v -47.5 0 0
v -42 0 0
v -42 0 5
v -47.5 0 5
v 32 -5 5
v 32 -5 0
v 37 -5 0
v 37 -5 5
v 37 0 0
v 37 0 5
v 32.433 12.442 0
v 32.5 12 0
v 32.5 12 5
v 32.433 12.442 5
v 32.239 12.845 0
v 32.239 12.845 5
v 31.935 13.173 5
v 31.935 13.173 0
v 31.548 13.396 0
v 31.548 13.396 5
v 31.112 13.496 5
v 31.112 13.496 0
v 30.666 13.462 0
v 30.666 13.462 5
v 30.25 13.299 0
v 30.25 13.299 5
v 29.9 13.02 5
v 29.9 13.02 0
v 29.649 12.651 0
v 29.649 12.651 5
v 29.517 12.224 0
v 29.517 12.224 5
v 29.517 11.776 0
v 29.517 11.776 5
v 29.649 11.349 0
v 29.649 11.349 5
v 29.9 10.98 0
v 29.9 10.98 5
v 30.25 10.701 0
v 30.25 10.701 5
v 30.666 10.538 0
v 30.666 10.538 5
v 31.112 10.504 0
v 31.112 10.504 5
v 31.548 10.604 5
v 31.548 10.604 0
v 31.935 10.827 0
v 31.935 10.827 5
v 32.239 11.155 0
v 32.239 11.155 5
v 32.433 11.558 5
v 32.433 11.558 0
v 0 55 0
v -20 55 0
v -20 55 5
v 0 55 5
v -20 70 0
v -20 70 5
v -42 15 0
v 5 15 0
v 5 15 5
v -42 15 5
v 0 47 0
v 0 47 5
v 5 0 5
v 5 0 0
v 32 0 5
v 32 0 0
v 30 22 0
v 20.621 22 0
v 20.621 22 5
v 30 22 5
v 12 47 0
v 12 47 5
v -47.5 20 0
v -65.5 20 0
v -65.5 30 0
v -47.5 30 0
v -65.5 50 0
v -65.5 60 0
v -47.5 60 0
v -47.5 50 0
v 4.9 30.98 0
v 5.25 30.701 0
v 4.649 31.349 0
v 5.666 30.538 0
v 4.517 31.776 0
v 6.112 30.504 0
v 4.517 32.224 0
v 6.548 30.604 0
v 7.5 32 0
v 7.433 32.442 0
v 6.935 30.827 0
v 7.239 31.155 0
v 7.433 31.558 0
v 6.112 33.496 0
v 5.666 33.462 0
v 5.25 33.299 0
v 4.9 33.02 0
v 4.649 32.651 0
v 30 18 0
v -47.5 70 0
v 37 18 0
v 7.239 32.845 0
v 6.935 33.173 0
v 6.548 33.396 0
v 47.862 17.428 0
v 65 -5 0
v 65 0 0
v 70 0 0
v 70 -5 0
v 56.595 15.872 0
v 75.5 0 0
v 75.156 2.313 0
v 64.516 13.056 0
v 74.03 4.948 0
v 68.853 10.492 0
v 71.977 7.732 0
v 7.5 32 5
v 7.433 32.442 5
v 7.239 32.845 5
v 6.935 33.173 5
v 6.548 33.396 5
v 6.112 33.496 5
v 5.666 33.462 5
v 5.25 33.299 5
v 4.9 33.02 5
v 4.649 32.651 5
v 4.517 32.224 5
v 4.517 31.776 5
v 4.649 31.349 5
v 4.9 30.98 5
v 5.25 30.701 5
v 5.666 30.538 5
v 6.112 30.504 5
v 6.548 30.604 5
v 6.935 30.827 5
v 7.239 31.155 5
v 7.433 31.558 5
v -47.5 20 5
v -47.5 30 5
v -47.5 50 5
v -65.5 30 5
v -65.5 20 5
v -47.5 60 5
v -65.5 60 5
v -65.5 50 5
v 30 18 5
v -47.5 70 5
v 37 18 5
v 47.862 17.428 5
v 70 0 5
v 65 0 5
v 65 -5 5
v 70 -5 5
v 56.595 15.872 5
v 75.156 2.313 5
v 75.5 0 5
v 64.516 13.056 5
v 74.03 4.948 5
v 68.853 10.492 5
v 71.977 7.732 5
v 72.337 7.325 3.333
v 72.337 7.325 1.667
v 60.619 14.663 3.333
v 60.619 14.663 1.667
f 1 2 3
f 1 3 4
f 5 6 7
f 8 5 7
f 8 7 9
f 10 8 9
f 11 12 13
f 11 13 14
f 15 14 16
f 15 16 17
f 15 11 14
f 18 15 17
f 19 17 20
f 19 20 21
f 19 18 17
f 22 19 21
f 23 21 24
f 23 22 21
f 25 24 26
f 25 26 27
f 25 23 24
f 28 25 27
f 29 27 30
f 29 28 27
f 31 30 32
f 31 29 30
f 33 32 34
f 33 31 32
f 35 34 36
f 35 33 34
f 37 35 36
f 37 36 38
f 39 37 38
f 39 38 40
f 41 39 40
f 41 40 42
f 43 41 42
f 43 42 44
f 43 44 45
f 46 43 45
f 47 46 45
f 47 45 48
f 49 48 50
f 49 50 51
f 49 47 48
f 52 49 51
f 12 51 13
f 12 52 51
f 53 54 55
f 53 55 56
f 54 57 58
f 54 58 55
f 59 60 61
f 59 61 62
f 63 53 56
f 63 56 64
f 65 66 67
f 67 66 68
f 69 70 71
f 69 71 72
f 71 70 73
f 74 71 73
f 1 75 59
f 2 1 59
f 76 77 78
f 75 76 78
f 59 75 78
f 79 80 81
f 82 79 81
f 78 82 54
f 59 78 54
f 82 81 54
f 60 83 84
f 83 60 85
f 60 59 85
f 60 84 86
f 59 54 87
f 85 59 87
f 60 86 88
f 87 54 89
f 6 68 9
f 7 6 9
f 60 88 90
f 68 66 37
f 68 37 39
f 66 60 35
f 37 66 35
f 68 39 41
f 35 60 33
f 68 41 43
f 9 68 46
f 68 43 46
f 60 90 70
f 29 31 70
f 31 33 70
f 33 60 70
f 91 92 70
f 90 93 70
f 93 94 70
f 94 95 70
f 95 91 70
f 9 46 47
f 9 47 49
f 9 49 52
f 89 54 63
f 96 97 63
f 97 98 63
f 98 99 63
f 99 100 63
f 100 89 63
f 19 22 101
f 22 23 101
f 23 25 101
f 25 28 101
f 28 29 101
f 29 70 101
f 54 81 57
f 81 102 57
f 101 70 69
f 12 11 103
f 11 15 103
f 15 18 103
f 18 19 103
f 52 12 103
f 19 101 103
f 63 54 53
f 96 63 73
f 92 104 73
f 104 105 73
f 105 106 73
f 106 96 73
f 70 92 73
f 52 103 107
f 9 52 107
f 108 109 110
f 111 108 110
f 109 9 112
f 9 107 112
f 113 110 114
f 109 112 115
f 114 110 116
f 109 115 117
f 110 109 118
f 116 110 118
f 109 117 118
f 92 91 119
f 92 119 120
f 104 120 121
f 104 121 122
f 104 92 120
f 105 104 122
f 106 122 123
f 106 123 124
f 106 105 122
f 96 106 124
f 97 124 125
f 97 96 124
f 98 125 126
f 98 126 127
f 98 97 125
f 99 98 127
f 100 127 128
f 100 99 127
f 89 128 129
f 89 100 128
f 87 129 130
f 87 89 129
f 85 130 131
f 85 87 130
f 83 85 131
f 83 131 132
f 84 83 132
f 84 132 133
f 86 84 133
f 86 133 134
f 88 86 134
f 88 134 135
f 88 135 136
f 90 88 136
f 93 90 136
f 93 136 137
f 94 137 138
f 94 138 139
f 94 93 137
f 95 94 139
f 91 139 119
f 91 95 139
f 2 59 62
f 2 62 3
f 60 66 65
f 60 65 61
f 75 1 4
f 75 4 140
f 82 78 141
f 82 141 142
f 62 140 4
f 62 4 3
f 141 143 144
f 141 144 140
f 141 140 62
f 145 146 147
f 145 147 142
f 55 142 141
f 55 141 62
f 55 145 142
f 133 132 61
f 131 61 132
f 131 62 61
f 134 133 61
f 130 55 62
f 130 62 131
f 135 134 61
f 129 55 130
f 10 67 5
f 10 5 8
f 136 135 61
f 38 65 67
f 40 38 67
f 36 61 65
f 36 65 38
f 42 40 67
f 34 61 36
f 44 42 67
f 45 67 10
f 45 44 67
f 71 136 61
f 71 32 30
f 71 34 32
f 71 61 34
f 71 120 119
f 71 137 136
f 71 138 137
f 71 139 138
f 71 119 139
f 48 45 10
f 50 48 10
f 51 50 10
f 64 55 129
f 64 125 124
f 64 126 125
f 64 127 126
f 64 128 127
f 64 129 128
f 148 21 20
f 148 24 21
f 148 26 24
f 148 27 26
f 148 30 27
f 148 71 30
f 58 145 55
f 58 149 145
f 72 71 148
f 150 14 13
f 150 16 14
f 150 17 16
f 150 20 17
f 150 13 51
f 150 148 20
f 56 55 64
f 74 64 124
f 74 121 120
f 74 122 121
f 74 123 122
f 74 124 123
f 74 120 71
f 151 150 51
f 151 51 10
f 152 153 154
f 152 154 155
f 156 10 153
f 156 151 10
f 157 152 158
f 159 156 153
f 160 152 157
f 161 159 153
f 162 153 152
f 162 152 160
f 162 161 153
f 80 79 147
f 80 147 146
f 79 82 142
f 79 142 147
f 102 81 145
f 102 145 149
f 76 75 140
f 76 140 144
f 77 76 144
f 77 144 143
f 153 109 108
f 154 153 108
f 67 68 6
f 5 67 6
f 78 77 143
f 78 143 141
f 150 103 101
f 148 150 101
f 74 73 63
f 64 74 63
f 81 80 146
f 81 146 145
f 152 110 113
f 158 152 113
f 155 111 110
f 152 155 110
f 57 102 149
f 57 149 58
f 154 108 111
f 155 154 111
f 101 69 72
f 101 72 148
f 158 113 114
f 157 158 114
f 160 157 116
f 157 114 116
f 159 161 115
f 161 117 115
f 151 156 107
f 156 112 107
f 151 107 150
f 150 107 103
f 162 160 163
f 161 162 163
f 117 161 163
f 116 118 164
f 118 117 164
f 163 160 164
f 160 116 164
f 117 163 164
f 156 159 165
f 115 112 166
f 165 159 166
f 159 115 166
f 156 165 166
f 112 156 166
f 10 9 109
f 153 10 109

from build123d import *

# Parameters (mm, degrees)
ESQUISSE1_R             = 1.5
BOSS_EXTRU_1_DEPTH      = 5
BOSS_EXTRU_2_DEPTH      = 5
ESQUISSE4_W             = 5
ESQUISSE4_H             = 15
ENL_V_MAT_EXTRU_1_DEPTH = 10


with BuildPart() as part:
    # Esquisse1 → Boss.-Extru.1 (new body)
    with BuildSketch(Plane.XY):
        Polygon((0, 0), (32, 0), (32, -5), (37, -5), (37, 0), (37, 18), (22, 18), (12, 47), (0, 47), align=None)
        with Locations((6, 32)):
            Circle(ESQUISSE1_R, mode=Mode.SUBTRACT)
        with Locations((31, 12)):
            Circle(ESQUISSE1_R, mode=Mode.SUBTRACT)
    extrude(amount=BOSS_EXTRU_1_DEPTH)

    # Esquisse2 → Boss.-Extru.2 (add)
    with BuildSketch(Plane(origin=(0, 0, 0), x_dir=(-1, 0, 0), z_dir=(0, 0, -1))):
        with BuildLine():
            Line((-37, 0), (-65, 0))
            Line((-65, 0), (-65, -5))
            Line((-65, -5), (-70, -5))
            Line((-70, -5), (-70, 0))
            Line((-70, 0), (-75.5, 0))
            add(Edge.make_bspline(
                [(-75.5, 0), (-75.5, 5.982232529), (-67.685409636, 18), (-37, 18)],
                knots=[0, 0, 0, 0, 1, 1, 1, 1], degree=3))
            Line((-37, 18), (-37, 0))
        make_face()
        Polygon((42, 0), (47.5, 0), (47.5, 20), (65.5, 20), (65.5, 30), (47.5, 30), (47.5, 50), (65.5, 50), (65.5, 60), (47.5, 60), (47.5, 70), (20, 70), (20, 55), (0, 55), (0, 15), (42, 15), align=None)
        Polygon((-30, 18), (-22, 18), (-20.620689655, 22), (-30, 22), align=None)
    extrude(amount=-BOSS_EXTRU_2_DEPTH)

    # Esquisse4 → Enlèv. mat.-Extru.1 (cut)
    with BuildSketch(Plane(origin=(0, 0, 0), x_dir=(-1, 0, 0), z_dir=(0, 0, -1))):
        with Locations((-2.5, 7.5)):
            Rectangle(ESQUISSE4_W, ESQUISSE4_H)
    extrude(amount=-ENL_V_MAT_EXTRU_1_DEPTH, mode=Mode.SUBTRACT)


solid = part.part
